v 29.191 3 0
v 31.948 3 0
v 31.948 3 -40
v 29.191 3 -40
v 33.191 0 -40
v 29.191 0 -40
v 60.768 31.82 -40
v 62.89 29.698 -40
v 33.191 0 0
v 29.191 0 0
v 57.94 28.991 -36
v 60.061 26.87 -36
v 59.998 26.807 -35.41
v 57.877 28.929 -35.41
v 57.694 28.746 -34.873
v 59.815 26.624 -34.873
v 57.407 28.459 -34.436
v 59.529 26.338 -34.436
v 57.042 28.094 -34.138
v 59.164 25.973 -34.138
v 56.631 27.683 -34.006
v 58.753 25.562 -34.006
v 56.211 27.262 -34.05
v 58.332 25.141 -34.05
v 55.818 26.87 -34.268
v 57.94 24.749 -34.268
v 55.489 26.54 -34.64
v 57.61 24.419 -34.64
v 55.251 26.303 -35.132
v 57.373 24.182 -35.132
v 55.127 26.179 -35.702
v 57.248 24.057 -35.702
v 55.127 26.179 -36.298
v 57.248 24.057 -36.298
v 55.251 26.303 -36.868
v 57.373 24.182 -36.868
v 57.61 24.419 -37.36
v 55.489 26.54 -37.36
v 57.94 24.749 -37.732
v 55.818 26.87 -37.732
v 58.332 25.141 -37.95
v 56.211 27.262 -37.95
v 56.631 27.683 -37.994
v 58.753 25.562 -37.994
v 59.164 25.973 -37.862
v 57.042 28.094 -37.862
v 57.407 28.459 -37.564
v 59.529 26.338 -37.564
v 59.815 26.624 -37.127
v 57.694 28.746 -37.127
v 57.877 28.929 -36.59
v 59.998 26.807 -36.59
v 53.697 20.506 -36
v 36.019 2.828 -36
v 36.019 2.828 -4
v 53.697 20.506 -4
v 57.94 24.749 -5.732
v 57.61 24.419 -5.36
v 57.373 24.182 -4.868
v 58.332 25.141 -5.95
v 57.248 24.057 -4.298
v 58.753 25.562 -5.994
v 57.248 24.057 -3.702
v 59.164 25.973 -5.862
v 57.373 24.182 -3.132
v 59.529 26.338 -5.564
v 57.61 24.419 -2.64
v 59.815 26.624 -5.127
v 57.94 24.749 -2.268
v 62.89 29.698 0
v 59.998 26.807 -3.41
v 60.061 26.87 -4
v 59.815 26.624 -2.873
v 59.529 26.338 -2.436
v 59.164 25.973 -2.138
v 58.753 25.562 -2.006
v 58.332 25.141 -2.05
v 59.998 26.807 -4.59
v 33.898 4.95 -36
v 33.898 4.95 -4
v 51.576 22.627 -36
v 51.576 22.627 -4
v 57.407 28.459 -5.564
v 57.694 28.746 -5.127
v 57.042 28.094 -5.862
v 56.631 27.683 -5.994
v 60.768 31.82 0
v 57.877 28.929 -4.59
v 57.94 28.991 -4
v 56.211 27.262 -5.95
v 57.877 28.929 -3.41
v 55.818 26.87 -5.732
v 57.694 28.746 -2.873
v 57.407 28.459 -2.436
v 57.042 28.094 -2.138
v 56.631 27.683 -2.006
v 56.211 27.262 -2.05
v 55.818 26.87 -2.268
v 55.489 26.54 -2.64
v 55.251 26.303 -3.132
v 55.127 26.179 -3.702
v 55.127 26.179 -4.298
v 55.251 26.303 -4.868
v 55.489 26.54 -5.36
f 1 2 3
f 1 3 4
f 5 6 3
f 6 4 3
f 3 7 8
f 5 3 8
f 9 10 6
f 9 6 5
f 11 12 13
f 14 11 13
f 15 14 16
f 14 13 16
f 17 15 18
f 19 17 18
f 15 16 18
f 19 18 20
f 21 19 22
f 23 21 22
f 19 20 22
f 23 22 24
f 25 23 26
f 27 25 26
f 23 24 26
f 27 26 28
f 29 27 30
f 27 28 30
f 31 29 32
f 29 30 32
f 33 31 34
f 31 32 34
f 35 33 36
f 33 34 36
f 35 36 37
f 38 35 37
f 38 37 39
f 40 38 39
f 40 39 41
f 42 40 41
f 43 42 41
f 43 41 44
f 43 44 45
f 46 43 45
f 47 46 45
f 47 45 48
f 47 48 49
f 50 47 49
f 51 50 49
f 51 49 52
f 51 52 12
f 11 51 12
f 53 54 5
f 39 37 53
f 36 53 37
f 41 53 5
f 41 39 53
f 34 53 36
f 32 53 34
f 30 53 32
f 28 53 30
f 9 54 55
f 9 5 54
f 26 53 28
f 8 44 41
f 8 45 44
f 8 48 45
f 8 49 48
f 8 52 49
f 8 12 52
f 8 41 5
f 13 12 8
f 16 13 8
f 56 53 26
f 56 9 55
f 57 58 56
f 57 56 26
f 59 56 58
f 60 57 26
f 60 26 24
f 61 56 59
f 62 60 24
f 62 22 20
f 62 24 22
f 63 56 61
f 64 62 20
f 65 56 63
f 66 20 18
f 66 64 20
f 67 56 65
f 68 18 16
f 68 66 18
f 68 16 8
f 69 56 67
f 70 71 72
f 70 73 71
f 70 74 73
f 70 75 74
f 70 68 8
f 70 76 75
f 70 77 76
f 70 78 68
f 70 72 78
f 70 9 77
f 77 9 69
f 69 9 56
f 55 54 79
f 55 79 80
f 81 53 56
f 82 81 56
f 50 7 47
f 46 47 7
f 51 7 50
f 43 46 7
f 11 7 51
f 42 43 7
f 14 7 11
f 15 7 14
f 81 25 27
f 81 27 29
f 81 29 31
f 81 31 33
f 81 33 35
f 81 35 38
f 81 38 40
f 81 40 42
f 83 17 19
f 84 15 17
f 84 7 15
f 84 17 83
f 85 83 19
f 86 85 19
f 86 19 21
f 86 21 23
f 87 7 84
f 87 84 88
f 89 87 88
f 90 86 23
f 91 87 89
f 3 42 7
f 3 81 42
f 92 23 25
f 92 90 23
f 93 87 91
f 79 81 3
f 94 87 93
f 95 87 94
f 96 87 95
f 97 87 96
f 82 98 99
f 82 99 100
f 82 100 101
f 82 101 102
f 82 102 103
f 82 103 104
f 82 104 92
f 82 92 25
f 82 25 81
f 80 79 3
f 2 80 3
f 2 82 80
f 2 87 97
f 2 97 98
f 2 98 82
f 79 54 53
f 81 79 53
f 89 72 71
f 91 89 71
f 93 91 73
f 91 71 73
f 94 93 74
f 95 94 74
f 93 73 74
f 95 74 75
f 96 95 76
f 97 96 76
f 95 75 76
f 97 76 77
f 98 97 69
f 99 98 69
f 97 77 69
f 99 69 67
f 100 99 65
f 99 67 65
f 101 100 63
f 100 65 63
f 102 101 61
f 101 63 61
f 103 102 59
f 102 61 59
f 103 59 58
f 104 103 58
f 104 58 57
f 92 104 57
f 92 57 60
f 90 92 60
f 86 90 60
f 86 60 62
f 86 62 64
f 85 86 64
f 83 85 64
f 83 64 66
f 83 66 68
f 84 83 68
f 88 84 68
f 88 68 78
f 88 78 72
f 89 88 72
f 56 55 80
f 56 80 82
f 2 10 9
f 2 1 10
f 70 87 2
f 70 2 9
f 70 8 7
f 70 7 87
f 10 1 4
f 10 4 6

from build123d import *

# Parameters (mm, degrees)
PAD001_DEPTH    = 40
SKETCH002_R     = 2
POCKET_DEPTH    = 5
SKETCH003_W     = 14.874642
SKETCH003_H     = 51.167498
SKETCH003_W_2   = 25
SKETCH003_H_2   = 32
POCKET001_DEPTH = 5


with BuildPart() as part:
    # Sketch001 → Pad001 (new body)
    with BuildSketch(Plane.XY):
        Polygon((33.191021, 0), (65.010826, 31.819805), (62.889506, 33.941125), (31.948381, 3), (29.191021, 3), (29.191021, 0), align=None)
    extrude(amount=-PAD001_DEPTH)

    # Sketch002 → Pocket (cut)
    with BuildSketch(Plane(origin=(16.595511, -16.595511, 0), x_dir=(0.707107, 0.707107, 0), z_dir=(0.707107, -0.707107, 0))):
        with Locations((59.469596, -36)):
            Circle(SKETCH002_R)
        with Locations((59.469596, -4)):
            Circle(SKETCH002_R)
    extrude(amount=-POCKET_DEPTH, mode=Mode.SUBTRACT)

    # Sketch003 → Pocket001 (cut)
    with BuildSketch(Plane(origin=(16.595511, -16.595511, 0), x_dir=(0.707107, 0.707107, 0), z_dir=(0.707107, -0.707107, 0))):
        with Locations((72.906917, -16.654673)):
            Rectangle(SKETCH003_W, SKETCH003_H)
        with Locations((39.969596, -20)):
            Rectangle(SKETCH003_W_2, SKETCH003_H_2)
    extrude(amount=-POCKET001_DEPTH, mode=Mode.SUBTRACT)


solid = part.part
